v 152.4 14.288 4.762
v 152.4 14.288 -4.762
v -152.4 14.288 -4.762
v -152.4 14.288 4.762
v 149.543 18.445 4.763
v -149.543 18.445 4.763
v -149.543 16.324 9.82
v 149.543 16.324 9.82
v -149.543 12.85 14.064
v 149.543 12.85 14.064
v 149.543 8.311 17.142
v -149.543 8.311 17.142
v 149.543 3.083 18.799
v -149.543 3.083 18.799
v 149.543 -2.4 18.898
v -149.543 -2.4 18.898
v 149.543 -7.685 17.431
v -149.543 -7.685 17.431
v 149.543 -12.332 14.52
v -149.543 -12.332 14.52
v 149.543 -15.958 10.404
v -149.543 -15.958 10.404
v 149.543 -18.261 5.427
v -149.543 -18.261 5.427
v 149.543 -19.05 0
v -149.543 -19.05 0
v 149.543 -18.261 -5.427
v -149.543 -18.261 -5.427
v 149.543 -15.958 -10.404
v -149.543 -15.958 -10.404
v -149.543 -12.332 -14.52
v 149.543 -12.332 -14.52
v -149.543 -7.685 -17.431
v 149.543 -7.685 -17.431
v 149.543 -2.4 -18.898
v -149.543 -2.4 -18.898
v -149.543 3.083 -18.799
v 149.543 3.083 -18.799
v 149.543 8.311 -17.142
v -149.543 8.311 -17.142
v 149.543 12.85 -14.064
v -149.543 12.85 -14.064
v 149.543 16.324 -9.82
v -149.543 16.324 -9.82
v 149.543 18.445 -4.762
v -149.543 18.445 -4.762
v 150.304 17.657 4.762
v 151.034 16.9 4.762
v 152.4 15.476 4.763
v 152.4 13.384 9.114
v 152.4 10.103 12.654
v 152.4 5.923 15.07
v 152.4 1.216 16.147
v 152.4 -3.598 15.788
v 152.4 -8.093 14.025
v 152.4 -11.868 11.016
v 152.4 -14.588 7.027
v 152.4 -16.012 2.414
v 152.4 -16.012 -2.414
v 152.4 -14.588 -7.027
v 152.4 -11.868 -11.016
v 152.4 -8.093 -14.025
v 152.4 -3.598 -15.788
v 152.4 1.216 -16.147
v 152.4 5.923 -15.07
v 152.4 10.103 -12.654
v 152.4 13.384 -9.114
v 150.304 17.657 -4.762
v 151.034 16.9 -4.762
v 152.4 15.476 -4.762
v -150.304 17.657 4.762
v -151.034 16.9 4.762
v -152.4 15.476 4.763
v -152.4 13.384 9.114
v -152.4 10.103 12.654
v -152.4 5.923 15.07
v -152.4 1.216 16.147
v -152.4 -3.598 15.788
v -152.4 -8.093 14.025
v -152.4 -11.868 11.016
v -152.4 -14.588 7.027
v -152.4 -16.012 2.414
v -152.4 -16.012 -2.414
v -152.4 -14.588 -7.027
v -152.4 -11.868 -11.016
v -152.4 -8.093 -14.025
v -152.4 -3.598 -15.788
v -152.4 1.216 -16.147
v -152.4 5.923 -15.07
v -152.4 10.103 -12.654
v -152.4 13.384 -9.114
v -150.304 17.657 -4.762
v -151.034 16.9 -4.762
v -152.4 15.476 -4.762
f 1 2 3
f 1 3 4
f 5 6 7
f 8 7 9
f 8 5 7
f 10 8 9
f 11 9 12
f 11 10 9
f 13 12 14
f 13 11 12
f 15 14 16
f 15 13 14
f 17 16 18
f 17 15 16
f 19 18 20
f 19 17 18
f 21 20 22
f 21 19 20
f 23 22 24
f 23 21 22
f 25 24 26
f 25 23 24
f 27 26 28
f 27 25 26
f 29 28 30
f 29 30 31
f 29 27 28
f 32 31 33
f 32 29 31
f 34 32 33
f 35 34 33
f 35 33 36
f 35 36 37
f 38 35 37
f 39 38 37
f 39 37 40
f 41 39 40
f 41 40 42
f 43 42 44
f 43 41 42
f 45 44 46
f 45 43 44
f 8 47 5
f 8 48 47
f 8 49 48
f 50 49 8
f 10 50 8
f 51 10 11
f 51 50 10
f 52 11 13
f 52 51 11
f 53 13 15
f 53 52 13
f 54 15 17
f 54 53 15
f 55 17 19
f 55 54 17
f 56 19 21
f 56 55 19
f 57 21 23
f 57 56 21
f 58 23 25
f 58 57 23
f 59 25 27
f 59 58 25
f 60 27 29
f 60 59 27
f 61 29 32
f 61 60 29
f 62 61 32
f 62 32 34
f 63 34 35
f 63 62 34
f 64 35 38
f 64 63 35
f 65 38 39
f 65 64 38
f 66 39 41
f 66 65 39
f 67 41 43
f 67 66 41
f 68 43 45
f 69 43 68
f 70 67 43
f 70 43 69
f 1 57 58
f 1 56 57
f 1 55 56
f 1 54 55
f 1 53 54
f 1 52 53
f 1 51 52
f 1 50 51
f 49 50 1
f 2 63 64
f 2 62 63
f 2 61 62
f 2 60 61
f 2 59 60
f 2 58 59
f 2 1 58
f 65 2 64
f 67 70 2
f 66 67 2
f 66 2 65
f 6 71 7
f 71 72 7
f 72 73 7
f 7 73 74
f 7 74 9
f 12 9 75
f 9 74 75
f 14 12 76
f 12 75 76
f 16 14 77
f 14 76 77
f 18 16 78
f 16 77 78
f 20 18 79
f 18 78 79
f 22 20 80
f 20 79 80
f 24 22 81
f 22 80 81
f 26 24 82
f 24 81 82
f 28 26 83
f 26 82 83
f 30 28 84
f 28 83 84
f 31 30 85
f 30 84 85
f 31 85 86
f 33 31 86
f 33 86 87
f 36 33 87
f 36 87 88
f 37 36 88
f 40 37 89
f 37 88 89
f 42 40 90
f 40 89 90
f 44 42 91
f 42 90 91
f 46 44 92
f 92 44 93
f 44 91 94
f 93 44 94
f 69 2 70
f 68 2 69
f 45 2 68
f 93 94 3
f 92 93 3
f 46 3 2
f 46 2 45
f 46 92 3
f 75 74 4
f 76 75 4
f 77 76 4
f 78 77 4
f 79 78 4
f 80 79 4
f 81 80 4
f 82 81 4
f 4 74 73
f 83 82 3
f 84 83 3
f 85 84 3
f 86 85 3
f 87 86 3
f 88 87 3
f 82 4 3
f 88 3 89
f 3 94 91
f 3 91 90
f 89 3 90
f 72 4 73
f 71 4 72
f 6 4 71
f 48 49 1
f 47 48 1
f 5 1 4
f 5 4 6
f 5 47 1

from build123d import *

# Parameters (mm, degrees)
SKETCH1_R           = 19.05
EXTRUDE1_DEPTH      = 152.4
CHAMFER1_SIZE       = 2.8575
SKETCH3_W           = 9.525
SKETCH3_H           = 4.7625
EXTRUDE2_DEPTH      = 153.4
EXTRUDE2_DEPTH_BACK = 153.4


with BuildPart() as part:
    # Sketch1 → Extrude1 (new body, symmetric)
    with BuildSketch(Plane(origin=(0, 0, 0), x_dir=(0, 0, -1), z_dir=(1, 0, 0))):
        Circle(SKETCH1_R)
    extrude(amount=EXTRUDE1_DEPTH, both=True)

    # Chamfer1
    chamfer1_edges = [part.edges().sort_by_distance(p)[0] for p in [
        (-152.4, 0, 19.05),
        (152.4, 0, 19.05),
    ]]
    chamfer(chamfer1_edges, length=CHAMFER1_SIZE)

    # Sketch3 → Extrude2 (cut, two sides)
    with BuildSketch(Plane.ZY) as extrude2_sk:
        with Locations((0, 16.66875)):
            Rectangle(SKETCH3_W, SKETCH3_H)
    extrude(amount=EXTRUDE2_DEPTH, mode=Mode.SUBTRACT)
    extrude(extrude2_sk.sketch, amount=-EXTRUDE2_DEPTH_BACK, mode=Mode.SUBTRACT)


solid = part.part
